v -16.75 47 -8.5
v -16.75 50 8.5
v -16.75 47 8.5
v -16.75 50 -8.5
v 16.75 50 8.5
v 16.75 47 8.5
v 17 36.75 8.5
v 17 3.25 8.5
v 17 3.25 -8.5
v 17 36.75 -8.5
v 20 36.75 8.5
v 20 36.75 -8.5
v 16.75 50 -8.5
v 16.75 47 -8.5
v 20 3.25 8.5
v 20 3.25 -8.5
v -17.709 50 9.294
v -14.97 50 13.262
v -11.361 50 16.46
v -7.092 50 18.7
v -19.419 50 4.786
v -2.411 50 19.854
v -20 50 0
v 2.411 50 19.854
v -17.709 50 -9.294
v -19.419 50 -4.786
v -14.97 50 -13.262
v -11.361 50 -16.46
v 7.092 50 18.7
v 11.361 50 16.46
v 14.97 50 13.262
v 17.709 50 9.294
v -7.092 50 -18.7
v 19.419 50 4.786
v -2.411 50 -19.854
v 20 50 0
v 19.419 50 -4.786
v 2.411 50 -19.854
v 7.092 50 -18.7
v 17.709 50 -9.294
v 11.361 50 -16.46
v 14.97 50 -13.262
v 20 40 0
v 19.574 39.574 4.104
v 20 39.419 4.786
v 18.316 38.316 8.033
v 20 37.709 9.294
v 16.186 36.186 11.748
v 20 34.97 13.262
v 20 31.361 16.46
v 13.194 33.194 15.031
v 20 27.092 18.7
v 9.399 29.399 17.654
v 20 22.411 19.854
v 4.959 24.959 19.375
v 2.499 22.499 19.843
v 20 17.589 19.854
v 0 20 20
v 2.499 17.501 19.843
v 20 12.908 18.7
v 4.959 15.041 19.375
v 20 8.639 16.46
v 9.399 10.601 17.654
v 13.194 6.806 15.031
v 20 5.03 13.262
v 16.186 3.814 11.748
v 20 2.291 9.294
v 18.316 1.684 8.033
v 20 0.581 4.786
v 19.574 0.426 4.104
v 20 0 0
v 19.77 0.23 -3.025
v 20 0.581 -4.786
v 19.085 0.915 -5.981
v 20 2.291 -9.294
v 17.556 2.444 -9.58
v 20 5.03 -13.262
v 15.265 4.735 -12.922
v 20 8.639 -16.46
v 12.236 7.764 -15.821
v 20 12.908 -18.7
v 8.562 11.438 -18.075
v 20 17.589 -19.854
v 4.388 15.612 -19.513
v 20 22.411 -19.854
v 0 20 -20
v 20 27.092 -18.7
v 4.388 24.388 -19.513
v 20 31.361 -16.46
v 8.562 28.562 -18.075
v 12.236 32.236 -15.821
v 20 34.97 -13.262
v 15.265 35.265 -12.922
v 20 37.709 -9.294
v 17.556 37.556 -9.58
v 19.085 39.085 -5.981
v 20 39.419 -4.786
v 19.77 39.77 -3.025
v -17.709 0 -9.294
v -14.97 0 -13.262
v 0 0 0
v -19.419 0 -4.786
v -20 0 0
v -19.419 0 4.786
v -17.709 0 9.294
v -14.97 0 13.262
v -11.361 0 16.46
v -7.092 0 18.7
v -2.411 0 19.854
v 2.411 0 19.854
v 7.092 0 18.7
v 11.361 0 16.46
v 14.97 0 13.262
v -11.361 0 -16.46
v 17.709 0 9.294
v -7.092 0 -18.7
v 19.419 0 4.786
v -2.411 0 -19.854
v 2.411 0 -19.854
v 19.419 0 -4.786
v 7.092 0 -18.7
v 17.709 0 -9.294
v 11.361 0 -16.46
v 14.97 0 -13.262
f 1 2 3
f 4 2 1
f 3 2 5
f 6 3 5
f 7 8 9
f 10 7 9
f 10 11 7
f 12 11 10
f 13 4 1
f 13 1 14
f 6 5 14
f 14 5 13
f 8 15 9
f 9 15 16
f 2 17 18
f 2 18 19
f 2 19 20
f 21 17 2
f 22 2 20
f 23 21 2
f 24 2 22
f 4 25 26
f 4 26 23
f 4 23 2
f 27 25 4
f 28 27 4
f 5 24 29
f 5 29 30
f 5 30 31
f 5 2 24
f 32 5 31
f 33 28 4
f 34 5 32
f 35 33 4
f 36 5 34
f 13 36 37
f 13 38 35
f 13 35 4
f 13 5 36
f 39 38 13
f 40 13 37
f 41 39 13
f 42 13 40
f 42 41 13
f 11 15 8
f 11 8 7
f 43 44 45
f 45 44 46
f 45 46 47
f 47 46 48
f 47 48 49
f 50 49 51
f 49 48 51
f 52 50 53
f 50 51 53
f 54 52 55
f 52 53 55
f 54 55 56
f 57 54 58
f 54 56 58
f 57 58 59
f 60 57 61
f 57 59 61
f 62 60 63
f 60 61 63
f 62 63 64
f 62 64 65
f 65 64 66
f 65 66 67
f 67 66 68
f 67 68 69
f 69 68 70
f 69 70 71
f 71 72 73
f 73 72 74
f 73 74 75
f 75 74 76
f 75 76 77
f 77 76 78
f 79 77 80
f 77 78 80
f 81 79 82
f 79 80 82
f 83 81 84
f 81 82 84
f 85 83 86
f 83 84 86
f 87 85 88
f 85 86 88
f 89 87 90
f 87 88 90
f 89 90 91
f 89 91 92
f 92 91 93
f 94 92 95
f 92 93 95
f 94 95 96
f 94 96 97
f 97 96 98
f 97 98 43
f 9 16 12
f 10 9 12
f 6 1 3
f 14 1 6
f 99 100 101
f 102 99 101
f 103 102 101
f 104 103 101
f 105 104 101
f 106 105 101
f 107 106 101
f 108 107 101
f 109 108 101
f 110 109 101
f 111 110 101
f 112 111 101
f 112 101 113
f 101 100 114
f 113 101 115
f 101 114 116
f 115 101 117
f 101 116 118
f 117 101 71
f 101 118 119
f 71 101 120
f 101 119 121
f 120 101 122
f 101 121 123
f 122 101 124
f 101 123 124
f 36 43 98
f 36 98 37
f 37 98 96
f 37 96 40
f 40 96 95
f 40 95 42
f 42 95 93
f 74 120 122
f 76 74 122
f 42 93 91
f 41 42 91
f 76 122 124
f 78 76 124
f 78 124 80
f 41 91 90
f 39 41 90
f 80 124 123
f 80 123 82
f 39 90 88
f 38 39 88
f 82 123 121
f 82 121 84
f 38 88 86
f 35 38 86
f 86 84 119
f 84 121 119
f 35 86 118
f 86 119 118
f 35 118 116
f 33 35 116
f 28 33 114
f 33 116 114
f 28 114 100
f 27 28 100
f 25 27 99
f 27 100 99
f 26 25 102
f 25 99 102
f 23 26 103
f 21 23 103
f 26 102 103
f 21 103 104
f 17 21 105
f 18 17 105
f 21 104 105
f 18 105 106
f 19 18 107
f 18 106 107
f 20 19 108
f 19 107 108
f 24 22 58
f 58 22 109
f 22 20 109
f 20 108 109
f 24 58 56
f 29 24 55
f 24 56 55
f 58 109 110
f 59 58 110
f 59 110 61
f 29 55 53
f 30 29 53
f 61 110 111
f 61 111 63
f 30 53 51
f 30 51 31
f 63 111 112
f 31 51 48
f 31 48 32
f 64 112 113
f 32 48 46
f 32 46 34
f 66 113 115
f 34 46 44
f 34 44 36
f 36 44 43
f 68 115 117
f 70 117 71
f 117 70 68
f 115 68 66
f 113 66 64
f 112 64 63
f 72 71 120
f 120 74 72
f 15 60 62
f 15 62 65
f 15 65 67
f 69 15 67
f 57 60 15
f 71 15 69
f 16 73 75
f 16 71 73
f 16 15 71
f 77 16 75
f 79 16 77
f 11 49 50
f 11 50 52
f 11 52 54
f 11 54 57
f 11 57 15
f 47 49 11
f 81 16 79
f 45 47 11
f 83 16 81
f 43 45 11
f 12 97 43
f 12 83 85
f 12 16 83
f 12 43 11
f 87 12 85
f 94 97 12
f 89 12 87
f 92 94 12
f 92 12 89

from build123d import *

# Parameters (mm, degrees)
CROQUIS1_R              = 20
SALIENTE_EXTRUIR1_DEPTH = 50
CROQUIS3_R              = 20
SALIENTE_EXTRUIR2_DEPTH = 20
CROQUIS4_W              = 33.5
CROQUIS4_H              = 17
CORTAR_EXTRUIR2_DEPTH   = 3
CROQUIS5_W              = 17
CROQUIS5_H              = 33.5
CORTAR_EXTRUIR3_DEPTH   = 3


with BuildPart() as part:
    # Croquis1 → Saliente-Extruir1 (new body)
    with BuildSketch(Plane(origin=(0, 0, 0), x_dir=(1, 0, 0), z_dir=(0, 1, 0))):
        Circle(CROQUIS1_R)
    extrude(amount=SALIENTE_EXTRUIR1_DEPTH)

    # Croquis3 → Saliente-Extruir2 (add)
    with BuildSketch(Plane(origin=(0, 0, 0), x_dir=(0, 0, -1), z_dir=(1, 0, 0))):
        with Locations((0, 20)):
            Circle(CROQUIS3_R)
    extrude(amount=SALIENTE_EXTRUIR2_DEPTH)

    # Croquis4 → Cortar-Extruir2 (cut)
    with BuildSketch(Plane(origin=(0, 50, 0), x_dir=(1, 0, 0), z_dir=(0, 1, 0))):
        Rectangle(CROQUIS4_W, CROQUIS4_H)
    extrude(amount=-CORTAR_EXTRUIR2_DEPTH, mode=Mode.SUBTRACT)

    # Croquis5 → Cortar-Extruir3 (cut)
    with BuildSketch(Plane(origin=(20, 0, 0), x_dir=(0, 0, -1), z_dir=(1, 0, 0))):
        with Locations((0, 20)):
            Rectangle(CROQUIS5_W, CROQUIS5_H)
    extrude(amount=-CORTAR_EXTRUIR3_DEPTH, mode=Mode.SUBTRACT)


solid = part.part
